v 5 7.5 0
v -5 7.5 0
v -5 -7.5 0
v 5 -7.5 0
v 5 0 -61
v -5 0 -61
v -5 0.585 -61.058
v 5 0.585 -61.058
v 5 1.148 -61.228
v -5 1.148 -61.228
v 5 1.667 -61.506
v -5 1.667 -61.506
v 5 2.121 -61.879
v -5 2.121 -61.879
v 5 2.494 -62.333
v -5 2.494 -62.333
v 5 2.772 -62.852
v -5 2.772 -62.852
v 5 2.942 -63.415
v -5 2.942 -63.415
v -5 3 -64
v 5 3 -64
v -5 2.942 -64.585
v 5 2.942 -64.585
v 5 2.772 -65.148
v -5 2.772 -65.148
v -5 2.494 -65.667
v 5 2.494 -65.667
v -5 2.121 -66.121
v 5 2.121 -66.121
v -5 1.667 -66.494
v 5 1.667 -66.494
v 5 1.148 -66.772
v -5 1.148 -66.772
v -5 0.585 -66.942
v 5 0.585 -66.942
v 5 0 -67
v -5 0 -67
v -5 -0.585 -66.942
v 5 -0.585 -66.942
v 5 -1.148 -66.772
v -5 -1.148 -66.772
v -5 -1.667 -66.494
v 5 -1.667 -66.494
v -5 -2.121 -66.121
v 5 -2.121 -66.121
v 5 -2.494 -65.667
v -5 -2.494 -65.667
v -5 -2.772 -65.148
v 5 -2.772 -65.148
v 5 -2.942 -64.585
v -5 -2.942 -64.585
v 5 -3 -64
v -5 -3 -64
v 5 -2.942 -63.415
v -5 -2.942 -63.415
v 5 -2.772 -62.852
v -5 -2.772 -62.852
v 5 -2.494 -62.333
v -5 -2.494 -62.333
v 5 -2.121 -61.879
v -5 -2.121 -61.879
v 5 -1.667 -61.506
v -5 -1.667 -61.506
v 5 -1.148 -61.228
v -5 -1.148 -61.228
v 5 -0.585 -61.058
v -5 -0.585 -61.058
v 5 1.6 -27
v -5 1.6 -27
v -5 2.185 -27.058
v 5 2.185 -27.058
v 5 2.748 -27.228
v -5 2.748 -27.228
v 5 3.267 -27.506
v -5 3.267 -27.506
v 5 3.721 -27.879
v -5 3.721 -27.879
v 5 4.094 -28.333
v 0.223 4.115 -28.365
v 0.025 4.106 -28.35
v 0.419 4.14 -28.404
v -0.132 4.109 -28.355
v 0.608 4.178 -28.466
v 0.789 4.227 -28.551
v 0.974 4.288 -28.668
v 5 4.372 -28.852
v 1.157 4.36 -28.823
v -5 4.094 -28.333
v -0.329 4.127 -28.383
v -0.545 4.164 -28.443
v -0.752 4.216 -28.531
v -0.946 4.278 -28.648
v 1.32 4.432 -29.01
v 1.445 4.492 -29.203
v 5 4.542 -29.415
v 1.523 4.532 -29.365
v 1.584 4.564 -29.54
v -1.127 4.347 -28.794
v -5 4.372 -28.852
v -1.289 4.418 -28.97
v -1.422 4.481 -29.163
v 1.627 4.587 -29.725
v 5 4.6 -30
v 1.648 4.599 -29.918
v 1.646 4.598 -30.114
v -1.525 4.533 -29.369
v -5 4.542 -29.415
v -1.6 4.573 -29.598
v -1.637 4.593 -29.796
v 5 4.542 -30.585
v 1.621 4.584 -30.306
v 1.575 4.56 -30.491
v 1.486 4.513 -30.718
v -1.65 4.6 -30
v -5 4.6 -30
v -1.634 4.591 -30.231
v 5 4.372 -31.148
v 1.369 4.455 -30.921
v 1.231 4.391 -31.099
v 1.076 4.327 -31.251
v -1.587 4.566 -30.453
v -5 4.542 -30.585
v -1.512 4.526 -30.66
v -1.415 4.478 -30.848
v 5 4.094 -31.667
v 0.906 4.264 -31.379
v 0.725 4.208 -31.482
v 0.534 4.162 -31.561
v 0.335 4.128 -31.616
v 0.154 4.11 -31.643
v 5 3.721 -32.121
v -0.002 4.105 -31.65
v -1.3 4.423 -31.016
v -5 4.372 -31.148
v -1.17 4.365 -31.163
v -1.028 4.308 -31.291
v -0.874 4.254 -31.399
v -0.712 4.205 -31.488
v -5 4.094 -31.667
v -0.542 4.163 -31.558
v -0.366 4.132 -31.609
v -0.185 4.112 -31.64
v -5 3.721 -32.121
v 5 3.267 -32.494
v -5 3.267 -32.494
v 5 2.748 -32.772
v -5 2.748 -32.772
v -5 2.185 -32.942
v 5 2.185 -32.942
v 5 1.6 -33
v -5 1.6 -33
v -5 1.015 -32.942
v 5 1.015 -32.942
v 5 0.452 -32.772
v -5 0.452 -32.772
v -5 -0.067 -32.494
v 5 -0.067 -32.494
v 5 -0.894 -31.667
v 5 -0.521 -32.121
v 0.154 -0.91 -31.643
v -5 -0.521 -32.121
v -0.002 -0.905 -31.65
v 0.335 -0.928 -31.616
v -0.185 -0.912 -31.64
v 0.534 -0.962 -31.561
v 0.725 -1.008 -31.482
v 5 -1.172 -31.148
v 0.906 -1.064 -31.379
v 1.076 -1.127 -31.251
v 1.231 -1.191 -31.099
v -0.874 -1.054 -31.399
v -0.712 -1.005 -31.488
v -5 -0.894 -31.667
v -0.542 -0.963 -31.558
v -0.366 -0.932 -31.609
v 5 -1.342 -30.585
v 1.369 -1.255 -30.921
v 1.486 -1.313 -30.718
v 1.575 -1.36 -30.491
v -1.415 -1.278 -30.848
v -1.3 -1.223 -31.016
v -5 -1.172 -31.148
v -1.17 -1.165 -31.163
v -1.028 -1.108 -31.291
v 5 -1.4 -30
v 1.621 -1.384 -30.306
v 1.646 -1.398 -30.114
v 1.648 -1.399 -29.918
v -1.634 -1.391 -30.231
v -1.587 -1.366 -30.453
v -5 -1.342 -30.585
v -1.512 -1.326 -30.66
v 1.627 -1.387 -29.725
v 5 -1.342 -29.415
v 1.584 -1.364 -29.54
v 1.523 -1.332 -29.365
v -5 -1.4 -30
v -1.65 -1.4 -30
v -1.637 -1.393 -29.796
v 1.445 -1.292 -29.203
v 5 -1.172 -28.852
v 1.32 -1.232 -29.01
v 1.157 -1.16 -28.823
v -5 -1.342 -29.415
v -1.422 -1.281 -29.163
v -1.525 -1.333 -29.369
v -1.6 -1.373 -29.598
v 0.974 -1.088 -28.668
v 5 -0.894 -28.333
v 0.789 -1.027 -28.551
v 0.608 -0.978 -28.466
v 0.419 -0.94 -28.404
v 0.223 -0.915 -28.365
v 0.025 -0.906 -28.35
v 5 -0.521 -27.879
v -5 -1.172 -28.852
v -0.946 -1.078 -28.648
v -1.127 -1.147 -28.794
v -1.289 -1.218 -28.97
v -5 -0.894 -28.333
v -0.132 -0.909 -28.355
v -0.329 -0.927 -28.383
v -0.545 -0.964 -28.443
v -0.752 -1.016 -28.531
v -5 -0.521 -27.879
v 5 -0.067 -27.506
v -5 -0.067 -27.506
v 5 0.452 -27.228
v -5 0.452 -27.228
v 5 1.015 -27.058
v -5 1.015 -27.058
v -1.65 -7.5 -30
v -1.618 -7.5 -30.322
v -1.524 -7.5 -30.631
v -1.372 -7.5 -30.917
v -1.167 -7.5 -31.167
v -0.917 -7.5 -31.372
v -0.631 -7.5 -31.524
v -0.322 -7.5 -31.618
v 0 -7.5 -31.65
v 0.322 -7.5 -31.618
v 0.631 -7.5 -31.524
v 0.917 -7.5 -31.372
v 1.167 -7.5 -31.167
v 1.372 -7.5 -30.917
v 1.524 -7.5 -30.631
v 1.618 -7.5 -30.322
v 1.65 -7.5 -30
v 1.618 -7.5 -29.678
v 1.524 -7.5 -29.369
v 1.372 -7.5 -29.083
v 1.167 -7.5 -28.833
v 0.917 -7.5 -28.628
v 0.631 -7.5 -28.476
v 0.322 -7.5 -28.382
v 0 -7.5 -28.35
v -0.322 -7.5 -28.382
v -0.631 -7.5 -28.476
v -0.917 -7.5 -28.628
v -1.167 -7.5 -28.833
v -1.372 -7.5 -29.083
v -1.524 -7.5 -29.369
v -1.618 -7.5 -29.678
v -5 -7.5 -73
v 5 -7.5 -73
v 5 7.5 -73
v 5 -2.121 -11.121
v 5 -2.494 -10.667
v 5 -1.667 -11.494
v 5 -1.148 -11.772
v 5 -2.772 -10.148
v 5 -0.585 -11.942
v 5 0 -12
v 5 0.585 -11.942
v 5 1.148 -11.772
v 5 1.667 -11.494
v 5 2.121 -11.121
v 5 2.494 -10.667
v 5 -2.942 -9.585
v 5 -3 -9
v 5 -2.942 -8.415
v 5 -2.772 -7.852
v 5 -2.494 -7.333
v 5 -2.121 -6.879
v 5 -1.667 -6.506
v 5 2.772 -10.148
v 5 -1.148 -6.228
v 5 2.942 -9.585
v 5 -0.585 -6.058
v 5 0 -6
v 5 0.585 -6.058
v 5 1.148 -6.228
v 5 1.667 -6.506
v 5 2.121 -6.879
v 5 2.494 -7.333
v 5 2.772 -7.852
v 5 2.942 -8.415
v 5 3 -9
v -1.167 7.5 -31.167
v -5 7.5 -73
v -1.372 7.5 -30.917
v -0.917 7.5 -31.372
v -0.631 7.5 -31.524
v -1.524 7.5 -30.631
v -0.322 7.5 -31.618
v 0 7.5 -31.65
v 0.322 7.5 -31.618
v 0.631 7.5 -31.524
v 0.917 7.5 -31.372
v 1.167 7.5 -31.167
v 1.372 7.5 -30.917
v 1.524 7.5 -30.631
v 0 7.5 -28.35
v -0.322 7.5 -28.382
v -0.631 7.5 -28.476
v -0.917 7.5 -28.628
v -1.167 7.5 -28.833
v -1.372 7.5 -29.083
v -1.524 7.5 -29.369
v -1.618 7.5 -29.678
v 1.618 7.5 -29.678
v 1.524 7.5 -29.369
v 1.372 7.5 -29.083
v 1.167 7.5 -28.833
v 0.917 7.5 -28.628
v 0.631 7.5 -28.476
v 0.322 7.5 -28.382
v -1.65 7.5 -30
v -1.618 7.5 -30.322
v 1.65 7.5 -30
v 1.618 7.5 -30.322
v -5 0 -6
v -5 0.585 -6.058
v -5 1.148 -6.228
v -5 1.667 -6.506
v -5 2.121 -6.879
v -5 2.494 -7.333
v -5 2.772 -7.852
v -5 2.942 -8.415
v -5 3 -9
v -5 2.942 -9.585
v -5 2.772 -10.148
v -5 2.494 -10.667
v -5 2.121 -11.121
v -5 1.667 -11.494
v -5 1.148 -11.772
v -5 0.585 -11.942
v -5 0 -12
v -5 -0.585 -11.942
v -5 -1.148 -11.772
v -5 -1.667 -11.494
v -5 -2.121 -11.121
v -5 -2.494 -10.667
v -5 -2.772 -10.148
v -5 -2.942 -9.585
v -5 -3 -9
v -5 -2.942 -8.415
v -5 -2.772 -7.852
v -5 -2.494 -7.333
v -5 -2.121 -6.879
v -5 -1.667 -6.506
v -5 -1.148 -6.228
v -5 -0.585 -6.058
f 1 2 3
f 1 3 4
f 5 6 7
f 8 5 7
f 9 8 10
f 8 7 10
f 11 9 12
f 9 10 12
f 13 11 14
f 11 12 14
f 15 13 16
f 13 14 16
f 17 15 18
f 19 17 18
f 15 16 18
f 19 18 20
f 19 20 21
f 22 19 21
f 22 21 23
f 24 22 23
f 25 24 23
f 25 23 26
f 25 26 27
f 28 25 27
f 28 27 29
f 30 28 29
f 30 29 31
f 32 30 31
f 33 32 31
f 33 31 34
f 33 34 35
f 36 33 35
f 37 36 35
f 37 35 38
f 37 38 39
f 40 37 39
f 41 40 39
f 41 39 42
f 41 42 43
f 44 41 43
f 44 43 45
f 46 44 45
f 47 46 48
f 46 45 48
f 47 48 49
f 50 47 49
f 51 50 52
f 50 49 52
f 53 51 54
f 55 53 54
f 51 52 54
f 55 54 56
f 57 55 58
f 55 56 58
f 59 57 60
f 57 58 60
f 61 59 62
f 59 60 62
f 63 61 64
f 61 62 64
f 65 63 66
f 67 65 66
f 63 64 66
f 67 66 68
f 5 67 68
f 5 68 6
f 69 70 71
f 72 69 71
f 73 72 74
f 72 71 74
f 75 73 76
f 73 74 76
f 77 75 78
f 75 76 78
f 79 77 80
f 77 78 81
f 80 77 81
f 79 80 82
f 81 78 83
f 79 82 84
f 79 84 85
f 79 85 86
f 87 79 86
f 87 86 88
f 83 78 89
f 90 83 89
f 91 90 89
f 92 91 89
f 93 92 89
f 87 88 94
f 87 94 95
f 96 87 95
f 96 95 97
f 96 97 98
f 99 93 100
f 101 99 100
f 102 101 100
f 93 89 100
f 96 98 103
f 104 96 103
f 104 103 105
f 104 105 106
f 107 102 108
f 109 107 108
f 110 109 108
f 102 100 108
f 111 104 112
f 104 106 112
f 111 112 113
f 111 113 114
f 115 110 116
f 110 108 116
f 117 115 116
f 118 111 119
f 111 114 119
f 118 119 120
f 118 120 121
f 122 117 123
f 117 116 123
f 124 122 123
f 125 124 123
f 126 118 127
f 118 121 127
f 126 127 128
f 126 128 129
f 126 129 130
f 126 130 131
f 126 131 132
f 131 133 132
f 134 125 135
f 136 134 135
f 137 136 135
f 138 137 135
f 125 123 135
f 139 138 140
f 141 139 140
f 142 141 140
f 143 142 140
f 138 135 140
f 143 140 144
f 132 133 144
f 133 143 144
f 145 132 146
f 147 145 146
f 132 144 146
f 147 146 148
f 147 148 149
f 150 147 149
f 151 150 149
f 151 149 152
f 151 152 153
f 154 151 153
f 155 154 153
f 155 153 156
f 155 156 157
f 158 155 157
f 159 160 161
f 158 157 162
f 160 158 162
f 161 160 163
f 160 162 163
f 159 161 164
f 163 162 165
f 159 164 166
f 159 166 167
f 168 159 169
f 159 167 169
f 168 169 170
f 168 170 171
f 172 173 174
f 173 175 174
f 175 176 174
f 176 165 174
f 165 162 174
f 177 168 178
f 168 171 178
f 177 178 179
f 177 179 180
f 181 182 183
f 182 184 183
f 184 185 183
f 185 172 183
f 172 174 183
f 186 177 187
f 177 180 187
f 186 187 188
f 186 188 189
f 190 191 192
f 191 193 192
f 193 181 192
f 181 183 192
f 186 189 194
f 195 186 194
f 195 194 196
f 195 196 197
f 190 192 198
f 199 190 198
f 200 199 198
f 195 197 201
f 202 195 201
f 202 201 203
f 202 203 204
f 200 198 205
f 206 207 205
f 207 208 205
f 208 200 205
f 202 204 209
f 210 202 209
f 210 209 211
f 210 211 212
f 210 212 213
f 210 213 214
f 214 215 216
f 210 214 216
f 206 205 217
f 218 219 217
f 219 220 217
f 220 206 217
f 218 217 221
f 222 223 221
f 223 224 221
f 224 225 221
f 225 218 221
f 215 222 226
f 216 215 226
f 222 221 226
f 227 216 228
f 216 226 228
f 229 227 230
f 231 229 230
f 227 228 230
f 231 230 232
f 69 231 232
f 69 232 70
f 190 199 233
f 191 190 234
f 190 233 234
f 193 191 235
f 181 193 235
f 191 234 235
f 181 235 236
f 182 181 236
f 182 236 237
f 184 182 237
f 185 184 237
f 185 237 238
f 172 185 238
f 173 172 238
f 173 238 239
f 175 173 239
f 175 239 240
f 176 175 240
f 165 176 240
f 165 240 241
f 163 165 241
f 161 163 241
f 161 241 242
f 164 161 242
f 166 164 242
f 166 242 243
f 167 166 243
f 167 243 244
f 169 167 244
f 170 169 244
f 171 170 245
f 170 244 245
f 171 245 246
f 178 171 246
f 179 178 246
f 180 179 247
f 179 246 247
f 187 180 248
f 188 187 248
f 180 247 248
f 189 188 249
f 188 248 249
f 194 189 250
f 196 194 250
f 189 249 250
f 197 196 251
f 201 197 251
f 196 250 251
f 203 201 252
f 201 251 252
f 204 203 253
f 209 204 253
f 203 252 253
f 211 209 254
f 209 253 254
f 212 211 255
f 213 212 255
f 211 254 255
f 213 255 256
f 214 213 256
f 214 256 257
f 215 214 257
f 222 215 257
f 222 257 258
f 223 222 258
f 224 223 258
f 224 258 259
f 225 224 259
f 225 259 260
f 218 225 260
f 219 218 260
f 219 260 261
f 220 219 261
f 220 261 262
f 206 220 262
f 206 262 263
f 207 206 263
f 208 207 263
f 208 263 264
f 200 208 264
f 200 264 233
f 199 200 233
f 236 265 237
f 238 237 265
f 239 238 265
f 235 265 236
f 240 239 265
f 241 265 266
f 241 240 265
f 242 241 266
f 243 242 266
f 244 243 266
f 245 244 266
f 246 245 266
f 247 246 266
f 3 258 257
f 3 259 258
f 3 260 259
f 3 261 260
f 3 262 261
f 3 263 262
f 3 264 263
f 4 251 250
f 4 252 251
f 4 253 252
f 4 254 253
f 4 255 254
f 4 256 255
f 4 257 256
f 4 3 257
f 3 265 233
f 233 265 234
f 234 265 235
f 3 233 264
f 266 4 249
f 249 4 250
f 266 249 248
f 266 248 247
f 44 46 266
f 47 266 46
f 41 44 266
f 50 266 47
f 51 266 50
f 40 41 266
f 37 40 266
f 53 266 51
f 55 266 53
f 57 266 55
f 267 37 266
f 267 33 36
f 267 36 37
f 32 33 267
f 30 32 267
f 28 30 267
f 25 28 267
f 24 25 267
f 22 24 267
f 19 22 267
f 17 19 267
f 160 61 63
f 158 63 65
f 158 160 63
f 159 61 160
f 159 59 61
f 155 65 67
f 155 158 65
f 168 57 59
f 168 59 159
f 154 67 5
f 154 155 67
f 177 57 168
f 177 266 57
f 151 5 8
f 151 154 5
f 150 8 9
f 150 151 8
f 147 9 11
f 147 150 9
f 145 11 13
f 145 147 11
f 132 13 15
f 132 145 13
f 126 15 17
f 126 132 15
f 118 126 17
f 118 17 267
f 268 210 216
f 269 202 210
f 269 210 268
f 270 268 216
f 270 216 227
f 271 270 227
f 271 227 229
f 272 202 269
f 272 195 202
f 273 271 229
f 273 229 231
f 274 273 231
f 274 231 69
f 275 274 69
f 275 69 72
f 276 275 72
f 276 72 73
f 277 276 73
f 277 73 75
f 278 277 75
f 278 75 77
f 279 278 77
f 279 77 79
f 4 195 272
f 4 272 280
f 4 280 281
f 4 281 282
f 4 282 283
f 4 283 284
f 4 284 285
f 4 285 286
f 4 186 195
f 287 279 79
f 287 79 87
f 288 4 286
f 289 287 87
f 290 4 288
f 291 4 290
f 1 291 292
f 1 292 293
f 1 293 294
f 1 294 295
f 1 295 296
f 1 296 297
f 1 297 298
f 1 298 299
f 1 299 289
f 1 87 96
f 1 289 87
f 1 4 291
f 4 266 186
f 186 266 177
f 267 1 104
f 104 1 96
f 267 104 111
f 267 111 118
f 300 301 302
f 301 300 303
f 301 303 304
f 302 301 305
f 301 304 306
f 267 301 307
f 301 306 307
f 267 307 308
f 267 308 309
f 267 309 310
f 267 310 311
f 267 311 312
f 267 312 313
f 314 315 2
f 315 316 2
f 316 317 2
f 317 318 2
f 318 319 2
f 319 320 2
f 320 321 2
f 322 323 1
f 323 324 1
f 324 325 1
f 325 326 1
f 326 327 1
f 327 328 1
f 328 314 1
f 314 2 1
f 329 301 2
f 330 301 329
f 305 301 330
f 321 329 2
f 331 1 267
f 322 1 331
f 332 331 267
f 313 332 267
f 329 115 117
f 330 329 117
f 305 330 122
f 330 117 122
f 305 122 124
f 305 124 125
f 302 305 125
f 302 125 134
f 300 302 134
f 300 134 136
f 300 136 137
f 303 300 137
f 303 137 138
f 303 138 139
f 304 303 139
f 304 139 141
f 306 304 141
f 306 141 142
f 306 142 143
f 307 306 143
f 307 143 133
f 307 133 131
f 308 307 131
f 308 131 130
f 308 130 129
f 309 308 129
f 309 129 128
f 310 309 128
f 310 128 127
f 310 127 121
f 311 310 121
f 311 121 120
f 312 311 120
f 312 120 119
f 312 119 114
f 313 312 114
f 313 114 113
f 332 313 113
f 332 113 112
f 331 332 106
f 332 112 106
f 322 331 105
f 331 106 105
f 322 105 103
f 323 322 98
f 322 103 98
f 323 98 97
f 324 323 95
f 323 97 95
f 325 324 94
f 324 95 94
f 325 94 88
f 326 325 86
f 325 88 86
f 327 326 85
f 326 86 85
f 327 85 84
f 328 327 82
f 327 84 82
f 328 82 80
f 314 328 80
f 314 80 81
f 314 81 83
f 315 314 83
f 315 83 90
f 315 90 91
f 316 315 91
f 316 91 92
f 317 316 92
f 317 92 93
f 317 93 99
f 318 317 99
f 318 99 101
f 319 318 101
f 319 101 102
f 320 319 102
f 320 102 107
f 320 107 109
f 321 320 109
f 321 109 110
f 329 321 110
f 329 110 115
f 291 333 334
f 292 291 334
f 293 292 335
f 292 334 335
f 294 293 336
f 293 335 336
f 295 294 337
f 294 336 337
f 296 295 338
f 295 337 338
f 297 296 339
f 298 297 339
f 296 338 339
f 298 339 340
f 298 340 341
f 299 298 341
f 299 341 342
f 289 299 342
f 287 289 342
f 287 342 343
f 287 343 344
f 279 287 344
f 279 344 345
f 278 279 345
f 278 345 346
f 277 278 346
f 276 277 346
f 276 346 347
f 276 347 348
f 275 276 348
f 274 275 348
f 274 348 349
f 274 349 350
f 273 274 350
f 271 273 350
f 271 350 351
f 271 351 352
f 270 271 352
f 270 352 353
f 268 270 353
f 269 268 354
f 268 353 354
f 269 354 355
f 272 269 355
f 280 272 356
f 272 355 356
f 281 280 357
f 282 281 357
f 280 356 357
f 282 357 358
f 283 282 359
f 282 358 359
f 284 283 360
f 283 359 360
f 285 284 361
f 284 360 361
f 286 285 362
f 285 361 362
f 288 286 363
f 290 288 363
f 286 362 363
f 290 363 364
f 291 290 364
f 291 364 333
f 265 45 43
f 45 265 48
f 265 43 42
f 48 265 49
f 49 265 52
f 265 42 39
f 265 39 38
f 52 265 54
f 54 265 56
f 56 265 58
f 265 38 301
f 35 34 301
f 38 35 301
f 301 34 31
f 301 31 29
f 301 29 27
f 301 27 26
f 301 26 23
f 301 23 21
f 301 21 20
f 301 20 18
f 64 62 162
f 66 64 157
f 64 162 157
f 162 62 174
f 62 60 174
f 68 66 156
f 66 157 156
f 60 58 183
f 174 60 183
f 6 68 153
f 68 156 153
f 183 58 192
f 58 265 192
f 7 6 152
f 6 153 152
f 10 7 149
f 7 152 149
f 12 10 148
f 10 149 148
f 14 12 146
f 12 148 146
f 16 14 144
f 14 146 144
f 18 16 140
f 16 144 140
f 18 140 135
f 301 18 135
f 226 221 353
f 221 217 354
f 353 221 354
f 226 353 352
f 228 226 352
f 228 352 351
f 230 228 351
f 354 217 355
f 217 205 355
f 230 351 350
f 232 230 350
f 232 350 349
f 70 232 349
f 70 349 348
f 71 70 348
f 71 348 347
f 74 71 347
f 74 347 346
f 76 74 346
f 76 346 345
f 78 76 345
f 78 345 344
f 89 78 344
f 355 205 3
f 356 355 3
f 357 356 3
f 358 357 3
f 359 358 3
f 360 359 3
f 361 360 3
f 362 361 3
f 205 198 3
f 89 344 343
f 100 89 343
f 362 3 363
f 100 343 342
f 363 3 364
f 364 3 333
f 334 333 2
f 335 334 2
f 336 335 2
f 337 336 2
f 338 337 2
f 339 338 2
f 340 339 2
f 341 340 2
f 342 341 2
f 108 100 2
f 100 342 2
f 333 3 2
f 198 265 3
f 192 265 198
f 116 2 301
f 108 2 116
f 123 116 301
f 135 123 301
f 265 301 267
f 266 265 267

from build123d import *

# Parameters (mm, degrees)
SKETCH1_W                = 10
SKETCH1_H                = 15
BOSS_EXTRUDE1_DEPTH      = 73
F_6_0_6_DIAMETER_HOLE1_D = 6
F_6_0_6_DIAMETER_HOLE2_D = 6
M4X0_7_TAPPED_HOLE1_D    = 3.3


with BuildPart() as part:
    # Sketch1 → Boss-Extrude1 (new body)
    with BuildSketch(Plane.XY):
        Rectangle(SKETCH1_W, SKETCH1_H)
    extrude(amount=-BOSS_EXTRUDE1_DEPTH)

    # Ø6.0 (6) Diameter Hole1 (through all)
    with Locations(Plane(origin=(5, 0, 0), x_dir=(0, 0, -1), z_dir=(1, 0, 0))):
        with Locations((9, 0), (64, 0)):
            Hole(F_6_0_6_DIAMETER_HOLE1_D / 2)

    # Ø6.0 (6) Diameter Hole2 (through all)
    with Locations(Plane(origin=(5, 0, 0), x_dir=(0, 0, -1), z_dir=(1, 0, 0))):
        with Locations((30, 1.6)):
            Hole(F_6_0_6_DIAMETER_HOLE2_D / 2)

    # M4x0.7 Tapped Hole1 (through all)
    with Locations(Plane(origin=(0, 7.5, 0), x_dir=(1, 0, 0), z_dir=(0, 1, 0))):
        with Locations((0, 30)):
            Hole(M4X0_7_TAPPED_HOLE1_D / 2)


solid = part.part
